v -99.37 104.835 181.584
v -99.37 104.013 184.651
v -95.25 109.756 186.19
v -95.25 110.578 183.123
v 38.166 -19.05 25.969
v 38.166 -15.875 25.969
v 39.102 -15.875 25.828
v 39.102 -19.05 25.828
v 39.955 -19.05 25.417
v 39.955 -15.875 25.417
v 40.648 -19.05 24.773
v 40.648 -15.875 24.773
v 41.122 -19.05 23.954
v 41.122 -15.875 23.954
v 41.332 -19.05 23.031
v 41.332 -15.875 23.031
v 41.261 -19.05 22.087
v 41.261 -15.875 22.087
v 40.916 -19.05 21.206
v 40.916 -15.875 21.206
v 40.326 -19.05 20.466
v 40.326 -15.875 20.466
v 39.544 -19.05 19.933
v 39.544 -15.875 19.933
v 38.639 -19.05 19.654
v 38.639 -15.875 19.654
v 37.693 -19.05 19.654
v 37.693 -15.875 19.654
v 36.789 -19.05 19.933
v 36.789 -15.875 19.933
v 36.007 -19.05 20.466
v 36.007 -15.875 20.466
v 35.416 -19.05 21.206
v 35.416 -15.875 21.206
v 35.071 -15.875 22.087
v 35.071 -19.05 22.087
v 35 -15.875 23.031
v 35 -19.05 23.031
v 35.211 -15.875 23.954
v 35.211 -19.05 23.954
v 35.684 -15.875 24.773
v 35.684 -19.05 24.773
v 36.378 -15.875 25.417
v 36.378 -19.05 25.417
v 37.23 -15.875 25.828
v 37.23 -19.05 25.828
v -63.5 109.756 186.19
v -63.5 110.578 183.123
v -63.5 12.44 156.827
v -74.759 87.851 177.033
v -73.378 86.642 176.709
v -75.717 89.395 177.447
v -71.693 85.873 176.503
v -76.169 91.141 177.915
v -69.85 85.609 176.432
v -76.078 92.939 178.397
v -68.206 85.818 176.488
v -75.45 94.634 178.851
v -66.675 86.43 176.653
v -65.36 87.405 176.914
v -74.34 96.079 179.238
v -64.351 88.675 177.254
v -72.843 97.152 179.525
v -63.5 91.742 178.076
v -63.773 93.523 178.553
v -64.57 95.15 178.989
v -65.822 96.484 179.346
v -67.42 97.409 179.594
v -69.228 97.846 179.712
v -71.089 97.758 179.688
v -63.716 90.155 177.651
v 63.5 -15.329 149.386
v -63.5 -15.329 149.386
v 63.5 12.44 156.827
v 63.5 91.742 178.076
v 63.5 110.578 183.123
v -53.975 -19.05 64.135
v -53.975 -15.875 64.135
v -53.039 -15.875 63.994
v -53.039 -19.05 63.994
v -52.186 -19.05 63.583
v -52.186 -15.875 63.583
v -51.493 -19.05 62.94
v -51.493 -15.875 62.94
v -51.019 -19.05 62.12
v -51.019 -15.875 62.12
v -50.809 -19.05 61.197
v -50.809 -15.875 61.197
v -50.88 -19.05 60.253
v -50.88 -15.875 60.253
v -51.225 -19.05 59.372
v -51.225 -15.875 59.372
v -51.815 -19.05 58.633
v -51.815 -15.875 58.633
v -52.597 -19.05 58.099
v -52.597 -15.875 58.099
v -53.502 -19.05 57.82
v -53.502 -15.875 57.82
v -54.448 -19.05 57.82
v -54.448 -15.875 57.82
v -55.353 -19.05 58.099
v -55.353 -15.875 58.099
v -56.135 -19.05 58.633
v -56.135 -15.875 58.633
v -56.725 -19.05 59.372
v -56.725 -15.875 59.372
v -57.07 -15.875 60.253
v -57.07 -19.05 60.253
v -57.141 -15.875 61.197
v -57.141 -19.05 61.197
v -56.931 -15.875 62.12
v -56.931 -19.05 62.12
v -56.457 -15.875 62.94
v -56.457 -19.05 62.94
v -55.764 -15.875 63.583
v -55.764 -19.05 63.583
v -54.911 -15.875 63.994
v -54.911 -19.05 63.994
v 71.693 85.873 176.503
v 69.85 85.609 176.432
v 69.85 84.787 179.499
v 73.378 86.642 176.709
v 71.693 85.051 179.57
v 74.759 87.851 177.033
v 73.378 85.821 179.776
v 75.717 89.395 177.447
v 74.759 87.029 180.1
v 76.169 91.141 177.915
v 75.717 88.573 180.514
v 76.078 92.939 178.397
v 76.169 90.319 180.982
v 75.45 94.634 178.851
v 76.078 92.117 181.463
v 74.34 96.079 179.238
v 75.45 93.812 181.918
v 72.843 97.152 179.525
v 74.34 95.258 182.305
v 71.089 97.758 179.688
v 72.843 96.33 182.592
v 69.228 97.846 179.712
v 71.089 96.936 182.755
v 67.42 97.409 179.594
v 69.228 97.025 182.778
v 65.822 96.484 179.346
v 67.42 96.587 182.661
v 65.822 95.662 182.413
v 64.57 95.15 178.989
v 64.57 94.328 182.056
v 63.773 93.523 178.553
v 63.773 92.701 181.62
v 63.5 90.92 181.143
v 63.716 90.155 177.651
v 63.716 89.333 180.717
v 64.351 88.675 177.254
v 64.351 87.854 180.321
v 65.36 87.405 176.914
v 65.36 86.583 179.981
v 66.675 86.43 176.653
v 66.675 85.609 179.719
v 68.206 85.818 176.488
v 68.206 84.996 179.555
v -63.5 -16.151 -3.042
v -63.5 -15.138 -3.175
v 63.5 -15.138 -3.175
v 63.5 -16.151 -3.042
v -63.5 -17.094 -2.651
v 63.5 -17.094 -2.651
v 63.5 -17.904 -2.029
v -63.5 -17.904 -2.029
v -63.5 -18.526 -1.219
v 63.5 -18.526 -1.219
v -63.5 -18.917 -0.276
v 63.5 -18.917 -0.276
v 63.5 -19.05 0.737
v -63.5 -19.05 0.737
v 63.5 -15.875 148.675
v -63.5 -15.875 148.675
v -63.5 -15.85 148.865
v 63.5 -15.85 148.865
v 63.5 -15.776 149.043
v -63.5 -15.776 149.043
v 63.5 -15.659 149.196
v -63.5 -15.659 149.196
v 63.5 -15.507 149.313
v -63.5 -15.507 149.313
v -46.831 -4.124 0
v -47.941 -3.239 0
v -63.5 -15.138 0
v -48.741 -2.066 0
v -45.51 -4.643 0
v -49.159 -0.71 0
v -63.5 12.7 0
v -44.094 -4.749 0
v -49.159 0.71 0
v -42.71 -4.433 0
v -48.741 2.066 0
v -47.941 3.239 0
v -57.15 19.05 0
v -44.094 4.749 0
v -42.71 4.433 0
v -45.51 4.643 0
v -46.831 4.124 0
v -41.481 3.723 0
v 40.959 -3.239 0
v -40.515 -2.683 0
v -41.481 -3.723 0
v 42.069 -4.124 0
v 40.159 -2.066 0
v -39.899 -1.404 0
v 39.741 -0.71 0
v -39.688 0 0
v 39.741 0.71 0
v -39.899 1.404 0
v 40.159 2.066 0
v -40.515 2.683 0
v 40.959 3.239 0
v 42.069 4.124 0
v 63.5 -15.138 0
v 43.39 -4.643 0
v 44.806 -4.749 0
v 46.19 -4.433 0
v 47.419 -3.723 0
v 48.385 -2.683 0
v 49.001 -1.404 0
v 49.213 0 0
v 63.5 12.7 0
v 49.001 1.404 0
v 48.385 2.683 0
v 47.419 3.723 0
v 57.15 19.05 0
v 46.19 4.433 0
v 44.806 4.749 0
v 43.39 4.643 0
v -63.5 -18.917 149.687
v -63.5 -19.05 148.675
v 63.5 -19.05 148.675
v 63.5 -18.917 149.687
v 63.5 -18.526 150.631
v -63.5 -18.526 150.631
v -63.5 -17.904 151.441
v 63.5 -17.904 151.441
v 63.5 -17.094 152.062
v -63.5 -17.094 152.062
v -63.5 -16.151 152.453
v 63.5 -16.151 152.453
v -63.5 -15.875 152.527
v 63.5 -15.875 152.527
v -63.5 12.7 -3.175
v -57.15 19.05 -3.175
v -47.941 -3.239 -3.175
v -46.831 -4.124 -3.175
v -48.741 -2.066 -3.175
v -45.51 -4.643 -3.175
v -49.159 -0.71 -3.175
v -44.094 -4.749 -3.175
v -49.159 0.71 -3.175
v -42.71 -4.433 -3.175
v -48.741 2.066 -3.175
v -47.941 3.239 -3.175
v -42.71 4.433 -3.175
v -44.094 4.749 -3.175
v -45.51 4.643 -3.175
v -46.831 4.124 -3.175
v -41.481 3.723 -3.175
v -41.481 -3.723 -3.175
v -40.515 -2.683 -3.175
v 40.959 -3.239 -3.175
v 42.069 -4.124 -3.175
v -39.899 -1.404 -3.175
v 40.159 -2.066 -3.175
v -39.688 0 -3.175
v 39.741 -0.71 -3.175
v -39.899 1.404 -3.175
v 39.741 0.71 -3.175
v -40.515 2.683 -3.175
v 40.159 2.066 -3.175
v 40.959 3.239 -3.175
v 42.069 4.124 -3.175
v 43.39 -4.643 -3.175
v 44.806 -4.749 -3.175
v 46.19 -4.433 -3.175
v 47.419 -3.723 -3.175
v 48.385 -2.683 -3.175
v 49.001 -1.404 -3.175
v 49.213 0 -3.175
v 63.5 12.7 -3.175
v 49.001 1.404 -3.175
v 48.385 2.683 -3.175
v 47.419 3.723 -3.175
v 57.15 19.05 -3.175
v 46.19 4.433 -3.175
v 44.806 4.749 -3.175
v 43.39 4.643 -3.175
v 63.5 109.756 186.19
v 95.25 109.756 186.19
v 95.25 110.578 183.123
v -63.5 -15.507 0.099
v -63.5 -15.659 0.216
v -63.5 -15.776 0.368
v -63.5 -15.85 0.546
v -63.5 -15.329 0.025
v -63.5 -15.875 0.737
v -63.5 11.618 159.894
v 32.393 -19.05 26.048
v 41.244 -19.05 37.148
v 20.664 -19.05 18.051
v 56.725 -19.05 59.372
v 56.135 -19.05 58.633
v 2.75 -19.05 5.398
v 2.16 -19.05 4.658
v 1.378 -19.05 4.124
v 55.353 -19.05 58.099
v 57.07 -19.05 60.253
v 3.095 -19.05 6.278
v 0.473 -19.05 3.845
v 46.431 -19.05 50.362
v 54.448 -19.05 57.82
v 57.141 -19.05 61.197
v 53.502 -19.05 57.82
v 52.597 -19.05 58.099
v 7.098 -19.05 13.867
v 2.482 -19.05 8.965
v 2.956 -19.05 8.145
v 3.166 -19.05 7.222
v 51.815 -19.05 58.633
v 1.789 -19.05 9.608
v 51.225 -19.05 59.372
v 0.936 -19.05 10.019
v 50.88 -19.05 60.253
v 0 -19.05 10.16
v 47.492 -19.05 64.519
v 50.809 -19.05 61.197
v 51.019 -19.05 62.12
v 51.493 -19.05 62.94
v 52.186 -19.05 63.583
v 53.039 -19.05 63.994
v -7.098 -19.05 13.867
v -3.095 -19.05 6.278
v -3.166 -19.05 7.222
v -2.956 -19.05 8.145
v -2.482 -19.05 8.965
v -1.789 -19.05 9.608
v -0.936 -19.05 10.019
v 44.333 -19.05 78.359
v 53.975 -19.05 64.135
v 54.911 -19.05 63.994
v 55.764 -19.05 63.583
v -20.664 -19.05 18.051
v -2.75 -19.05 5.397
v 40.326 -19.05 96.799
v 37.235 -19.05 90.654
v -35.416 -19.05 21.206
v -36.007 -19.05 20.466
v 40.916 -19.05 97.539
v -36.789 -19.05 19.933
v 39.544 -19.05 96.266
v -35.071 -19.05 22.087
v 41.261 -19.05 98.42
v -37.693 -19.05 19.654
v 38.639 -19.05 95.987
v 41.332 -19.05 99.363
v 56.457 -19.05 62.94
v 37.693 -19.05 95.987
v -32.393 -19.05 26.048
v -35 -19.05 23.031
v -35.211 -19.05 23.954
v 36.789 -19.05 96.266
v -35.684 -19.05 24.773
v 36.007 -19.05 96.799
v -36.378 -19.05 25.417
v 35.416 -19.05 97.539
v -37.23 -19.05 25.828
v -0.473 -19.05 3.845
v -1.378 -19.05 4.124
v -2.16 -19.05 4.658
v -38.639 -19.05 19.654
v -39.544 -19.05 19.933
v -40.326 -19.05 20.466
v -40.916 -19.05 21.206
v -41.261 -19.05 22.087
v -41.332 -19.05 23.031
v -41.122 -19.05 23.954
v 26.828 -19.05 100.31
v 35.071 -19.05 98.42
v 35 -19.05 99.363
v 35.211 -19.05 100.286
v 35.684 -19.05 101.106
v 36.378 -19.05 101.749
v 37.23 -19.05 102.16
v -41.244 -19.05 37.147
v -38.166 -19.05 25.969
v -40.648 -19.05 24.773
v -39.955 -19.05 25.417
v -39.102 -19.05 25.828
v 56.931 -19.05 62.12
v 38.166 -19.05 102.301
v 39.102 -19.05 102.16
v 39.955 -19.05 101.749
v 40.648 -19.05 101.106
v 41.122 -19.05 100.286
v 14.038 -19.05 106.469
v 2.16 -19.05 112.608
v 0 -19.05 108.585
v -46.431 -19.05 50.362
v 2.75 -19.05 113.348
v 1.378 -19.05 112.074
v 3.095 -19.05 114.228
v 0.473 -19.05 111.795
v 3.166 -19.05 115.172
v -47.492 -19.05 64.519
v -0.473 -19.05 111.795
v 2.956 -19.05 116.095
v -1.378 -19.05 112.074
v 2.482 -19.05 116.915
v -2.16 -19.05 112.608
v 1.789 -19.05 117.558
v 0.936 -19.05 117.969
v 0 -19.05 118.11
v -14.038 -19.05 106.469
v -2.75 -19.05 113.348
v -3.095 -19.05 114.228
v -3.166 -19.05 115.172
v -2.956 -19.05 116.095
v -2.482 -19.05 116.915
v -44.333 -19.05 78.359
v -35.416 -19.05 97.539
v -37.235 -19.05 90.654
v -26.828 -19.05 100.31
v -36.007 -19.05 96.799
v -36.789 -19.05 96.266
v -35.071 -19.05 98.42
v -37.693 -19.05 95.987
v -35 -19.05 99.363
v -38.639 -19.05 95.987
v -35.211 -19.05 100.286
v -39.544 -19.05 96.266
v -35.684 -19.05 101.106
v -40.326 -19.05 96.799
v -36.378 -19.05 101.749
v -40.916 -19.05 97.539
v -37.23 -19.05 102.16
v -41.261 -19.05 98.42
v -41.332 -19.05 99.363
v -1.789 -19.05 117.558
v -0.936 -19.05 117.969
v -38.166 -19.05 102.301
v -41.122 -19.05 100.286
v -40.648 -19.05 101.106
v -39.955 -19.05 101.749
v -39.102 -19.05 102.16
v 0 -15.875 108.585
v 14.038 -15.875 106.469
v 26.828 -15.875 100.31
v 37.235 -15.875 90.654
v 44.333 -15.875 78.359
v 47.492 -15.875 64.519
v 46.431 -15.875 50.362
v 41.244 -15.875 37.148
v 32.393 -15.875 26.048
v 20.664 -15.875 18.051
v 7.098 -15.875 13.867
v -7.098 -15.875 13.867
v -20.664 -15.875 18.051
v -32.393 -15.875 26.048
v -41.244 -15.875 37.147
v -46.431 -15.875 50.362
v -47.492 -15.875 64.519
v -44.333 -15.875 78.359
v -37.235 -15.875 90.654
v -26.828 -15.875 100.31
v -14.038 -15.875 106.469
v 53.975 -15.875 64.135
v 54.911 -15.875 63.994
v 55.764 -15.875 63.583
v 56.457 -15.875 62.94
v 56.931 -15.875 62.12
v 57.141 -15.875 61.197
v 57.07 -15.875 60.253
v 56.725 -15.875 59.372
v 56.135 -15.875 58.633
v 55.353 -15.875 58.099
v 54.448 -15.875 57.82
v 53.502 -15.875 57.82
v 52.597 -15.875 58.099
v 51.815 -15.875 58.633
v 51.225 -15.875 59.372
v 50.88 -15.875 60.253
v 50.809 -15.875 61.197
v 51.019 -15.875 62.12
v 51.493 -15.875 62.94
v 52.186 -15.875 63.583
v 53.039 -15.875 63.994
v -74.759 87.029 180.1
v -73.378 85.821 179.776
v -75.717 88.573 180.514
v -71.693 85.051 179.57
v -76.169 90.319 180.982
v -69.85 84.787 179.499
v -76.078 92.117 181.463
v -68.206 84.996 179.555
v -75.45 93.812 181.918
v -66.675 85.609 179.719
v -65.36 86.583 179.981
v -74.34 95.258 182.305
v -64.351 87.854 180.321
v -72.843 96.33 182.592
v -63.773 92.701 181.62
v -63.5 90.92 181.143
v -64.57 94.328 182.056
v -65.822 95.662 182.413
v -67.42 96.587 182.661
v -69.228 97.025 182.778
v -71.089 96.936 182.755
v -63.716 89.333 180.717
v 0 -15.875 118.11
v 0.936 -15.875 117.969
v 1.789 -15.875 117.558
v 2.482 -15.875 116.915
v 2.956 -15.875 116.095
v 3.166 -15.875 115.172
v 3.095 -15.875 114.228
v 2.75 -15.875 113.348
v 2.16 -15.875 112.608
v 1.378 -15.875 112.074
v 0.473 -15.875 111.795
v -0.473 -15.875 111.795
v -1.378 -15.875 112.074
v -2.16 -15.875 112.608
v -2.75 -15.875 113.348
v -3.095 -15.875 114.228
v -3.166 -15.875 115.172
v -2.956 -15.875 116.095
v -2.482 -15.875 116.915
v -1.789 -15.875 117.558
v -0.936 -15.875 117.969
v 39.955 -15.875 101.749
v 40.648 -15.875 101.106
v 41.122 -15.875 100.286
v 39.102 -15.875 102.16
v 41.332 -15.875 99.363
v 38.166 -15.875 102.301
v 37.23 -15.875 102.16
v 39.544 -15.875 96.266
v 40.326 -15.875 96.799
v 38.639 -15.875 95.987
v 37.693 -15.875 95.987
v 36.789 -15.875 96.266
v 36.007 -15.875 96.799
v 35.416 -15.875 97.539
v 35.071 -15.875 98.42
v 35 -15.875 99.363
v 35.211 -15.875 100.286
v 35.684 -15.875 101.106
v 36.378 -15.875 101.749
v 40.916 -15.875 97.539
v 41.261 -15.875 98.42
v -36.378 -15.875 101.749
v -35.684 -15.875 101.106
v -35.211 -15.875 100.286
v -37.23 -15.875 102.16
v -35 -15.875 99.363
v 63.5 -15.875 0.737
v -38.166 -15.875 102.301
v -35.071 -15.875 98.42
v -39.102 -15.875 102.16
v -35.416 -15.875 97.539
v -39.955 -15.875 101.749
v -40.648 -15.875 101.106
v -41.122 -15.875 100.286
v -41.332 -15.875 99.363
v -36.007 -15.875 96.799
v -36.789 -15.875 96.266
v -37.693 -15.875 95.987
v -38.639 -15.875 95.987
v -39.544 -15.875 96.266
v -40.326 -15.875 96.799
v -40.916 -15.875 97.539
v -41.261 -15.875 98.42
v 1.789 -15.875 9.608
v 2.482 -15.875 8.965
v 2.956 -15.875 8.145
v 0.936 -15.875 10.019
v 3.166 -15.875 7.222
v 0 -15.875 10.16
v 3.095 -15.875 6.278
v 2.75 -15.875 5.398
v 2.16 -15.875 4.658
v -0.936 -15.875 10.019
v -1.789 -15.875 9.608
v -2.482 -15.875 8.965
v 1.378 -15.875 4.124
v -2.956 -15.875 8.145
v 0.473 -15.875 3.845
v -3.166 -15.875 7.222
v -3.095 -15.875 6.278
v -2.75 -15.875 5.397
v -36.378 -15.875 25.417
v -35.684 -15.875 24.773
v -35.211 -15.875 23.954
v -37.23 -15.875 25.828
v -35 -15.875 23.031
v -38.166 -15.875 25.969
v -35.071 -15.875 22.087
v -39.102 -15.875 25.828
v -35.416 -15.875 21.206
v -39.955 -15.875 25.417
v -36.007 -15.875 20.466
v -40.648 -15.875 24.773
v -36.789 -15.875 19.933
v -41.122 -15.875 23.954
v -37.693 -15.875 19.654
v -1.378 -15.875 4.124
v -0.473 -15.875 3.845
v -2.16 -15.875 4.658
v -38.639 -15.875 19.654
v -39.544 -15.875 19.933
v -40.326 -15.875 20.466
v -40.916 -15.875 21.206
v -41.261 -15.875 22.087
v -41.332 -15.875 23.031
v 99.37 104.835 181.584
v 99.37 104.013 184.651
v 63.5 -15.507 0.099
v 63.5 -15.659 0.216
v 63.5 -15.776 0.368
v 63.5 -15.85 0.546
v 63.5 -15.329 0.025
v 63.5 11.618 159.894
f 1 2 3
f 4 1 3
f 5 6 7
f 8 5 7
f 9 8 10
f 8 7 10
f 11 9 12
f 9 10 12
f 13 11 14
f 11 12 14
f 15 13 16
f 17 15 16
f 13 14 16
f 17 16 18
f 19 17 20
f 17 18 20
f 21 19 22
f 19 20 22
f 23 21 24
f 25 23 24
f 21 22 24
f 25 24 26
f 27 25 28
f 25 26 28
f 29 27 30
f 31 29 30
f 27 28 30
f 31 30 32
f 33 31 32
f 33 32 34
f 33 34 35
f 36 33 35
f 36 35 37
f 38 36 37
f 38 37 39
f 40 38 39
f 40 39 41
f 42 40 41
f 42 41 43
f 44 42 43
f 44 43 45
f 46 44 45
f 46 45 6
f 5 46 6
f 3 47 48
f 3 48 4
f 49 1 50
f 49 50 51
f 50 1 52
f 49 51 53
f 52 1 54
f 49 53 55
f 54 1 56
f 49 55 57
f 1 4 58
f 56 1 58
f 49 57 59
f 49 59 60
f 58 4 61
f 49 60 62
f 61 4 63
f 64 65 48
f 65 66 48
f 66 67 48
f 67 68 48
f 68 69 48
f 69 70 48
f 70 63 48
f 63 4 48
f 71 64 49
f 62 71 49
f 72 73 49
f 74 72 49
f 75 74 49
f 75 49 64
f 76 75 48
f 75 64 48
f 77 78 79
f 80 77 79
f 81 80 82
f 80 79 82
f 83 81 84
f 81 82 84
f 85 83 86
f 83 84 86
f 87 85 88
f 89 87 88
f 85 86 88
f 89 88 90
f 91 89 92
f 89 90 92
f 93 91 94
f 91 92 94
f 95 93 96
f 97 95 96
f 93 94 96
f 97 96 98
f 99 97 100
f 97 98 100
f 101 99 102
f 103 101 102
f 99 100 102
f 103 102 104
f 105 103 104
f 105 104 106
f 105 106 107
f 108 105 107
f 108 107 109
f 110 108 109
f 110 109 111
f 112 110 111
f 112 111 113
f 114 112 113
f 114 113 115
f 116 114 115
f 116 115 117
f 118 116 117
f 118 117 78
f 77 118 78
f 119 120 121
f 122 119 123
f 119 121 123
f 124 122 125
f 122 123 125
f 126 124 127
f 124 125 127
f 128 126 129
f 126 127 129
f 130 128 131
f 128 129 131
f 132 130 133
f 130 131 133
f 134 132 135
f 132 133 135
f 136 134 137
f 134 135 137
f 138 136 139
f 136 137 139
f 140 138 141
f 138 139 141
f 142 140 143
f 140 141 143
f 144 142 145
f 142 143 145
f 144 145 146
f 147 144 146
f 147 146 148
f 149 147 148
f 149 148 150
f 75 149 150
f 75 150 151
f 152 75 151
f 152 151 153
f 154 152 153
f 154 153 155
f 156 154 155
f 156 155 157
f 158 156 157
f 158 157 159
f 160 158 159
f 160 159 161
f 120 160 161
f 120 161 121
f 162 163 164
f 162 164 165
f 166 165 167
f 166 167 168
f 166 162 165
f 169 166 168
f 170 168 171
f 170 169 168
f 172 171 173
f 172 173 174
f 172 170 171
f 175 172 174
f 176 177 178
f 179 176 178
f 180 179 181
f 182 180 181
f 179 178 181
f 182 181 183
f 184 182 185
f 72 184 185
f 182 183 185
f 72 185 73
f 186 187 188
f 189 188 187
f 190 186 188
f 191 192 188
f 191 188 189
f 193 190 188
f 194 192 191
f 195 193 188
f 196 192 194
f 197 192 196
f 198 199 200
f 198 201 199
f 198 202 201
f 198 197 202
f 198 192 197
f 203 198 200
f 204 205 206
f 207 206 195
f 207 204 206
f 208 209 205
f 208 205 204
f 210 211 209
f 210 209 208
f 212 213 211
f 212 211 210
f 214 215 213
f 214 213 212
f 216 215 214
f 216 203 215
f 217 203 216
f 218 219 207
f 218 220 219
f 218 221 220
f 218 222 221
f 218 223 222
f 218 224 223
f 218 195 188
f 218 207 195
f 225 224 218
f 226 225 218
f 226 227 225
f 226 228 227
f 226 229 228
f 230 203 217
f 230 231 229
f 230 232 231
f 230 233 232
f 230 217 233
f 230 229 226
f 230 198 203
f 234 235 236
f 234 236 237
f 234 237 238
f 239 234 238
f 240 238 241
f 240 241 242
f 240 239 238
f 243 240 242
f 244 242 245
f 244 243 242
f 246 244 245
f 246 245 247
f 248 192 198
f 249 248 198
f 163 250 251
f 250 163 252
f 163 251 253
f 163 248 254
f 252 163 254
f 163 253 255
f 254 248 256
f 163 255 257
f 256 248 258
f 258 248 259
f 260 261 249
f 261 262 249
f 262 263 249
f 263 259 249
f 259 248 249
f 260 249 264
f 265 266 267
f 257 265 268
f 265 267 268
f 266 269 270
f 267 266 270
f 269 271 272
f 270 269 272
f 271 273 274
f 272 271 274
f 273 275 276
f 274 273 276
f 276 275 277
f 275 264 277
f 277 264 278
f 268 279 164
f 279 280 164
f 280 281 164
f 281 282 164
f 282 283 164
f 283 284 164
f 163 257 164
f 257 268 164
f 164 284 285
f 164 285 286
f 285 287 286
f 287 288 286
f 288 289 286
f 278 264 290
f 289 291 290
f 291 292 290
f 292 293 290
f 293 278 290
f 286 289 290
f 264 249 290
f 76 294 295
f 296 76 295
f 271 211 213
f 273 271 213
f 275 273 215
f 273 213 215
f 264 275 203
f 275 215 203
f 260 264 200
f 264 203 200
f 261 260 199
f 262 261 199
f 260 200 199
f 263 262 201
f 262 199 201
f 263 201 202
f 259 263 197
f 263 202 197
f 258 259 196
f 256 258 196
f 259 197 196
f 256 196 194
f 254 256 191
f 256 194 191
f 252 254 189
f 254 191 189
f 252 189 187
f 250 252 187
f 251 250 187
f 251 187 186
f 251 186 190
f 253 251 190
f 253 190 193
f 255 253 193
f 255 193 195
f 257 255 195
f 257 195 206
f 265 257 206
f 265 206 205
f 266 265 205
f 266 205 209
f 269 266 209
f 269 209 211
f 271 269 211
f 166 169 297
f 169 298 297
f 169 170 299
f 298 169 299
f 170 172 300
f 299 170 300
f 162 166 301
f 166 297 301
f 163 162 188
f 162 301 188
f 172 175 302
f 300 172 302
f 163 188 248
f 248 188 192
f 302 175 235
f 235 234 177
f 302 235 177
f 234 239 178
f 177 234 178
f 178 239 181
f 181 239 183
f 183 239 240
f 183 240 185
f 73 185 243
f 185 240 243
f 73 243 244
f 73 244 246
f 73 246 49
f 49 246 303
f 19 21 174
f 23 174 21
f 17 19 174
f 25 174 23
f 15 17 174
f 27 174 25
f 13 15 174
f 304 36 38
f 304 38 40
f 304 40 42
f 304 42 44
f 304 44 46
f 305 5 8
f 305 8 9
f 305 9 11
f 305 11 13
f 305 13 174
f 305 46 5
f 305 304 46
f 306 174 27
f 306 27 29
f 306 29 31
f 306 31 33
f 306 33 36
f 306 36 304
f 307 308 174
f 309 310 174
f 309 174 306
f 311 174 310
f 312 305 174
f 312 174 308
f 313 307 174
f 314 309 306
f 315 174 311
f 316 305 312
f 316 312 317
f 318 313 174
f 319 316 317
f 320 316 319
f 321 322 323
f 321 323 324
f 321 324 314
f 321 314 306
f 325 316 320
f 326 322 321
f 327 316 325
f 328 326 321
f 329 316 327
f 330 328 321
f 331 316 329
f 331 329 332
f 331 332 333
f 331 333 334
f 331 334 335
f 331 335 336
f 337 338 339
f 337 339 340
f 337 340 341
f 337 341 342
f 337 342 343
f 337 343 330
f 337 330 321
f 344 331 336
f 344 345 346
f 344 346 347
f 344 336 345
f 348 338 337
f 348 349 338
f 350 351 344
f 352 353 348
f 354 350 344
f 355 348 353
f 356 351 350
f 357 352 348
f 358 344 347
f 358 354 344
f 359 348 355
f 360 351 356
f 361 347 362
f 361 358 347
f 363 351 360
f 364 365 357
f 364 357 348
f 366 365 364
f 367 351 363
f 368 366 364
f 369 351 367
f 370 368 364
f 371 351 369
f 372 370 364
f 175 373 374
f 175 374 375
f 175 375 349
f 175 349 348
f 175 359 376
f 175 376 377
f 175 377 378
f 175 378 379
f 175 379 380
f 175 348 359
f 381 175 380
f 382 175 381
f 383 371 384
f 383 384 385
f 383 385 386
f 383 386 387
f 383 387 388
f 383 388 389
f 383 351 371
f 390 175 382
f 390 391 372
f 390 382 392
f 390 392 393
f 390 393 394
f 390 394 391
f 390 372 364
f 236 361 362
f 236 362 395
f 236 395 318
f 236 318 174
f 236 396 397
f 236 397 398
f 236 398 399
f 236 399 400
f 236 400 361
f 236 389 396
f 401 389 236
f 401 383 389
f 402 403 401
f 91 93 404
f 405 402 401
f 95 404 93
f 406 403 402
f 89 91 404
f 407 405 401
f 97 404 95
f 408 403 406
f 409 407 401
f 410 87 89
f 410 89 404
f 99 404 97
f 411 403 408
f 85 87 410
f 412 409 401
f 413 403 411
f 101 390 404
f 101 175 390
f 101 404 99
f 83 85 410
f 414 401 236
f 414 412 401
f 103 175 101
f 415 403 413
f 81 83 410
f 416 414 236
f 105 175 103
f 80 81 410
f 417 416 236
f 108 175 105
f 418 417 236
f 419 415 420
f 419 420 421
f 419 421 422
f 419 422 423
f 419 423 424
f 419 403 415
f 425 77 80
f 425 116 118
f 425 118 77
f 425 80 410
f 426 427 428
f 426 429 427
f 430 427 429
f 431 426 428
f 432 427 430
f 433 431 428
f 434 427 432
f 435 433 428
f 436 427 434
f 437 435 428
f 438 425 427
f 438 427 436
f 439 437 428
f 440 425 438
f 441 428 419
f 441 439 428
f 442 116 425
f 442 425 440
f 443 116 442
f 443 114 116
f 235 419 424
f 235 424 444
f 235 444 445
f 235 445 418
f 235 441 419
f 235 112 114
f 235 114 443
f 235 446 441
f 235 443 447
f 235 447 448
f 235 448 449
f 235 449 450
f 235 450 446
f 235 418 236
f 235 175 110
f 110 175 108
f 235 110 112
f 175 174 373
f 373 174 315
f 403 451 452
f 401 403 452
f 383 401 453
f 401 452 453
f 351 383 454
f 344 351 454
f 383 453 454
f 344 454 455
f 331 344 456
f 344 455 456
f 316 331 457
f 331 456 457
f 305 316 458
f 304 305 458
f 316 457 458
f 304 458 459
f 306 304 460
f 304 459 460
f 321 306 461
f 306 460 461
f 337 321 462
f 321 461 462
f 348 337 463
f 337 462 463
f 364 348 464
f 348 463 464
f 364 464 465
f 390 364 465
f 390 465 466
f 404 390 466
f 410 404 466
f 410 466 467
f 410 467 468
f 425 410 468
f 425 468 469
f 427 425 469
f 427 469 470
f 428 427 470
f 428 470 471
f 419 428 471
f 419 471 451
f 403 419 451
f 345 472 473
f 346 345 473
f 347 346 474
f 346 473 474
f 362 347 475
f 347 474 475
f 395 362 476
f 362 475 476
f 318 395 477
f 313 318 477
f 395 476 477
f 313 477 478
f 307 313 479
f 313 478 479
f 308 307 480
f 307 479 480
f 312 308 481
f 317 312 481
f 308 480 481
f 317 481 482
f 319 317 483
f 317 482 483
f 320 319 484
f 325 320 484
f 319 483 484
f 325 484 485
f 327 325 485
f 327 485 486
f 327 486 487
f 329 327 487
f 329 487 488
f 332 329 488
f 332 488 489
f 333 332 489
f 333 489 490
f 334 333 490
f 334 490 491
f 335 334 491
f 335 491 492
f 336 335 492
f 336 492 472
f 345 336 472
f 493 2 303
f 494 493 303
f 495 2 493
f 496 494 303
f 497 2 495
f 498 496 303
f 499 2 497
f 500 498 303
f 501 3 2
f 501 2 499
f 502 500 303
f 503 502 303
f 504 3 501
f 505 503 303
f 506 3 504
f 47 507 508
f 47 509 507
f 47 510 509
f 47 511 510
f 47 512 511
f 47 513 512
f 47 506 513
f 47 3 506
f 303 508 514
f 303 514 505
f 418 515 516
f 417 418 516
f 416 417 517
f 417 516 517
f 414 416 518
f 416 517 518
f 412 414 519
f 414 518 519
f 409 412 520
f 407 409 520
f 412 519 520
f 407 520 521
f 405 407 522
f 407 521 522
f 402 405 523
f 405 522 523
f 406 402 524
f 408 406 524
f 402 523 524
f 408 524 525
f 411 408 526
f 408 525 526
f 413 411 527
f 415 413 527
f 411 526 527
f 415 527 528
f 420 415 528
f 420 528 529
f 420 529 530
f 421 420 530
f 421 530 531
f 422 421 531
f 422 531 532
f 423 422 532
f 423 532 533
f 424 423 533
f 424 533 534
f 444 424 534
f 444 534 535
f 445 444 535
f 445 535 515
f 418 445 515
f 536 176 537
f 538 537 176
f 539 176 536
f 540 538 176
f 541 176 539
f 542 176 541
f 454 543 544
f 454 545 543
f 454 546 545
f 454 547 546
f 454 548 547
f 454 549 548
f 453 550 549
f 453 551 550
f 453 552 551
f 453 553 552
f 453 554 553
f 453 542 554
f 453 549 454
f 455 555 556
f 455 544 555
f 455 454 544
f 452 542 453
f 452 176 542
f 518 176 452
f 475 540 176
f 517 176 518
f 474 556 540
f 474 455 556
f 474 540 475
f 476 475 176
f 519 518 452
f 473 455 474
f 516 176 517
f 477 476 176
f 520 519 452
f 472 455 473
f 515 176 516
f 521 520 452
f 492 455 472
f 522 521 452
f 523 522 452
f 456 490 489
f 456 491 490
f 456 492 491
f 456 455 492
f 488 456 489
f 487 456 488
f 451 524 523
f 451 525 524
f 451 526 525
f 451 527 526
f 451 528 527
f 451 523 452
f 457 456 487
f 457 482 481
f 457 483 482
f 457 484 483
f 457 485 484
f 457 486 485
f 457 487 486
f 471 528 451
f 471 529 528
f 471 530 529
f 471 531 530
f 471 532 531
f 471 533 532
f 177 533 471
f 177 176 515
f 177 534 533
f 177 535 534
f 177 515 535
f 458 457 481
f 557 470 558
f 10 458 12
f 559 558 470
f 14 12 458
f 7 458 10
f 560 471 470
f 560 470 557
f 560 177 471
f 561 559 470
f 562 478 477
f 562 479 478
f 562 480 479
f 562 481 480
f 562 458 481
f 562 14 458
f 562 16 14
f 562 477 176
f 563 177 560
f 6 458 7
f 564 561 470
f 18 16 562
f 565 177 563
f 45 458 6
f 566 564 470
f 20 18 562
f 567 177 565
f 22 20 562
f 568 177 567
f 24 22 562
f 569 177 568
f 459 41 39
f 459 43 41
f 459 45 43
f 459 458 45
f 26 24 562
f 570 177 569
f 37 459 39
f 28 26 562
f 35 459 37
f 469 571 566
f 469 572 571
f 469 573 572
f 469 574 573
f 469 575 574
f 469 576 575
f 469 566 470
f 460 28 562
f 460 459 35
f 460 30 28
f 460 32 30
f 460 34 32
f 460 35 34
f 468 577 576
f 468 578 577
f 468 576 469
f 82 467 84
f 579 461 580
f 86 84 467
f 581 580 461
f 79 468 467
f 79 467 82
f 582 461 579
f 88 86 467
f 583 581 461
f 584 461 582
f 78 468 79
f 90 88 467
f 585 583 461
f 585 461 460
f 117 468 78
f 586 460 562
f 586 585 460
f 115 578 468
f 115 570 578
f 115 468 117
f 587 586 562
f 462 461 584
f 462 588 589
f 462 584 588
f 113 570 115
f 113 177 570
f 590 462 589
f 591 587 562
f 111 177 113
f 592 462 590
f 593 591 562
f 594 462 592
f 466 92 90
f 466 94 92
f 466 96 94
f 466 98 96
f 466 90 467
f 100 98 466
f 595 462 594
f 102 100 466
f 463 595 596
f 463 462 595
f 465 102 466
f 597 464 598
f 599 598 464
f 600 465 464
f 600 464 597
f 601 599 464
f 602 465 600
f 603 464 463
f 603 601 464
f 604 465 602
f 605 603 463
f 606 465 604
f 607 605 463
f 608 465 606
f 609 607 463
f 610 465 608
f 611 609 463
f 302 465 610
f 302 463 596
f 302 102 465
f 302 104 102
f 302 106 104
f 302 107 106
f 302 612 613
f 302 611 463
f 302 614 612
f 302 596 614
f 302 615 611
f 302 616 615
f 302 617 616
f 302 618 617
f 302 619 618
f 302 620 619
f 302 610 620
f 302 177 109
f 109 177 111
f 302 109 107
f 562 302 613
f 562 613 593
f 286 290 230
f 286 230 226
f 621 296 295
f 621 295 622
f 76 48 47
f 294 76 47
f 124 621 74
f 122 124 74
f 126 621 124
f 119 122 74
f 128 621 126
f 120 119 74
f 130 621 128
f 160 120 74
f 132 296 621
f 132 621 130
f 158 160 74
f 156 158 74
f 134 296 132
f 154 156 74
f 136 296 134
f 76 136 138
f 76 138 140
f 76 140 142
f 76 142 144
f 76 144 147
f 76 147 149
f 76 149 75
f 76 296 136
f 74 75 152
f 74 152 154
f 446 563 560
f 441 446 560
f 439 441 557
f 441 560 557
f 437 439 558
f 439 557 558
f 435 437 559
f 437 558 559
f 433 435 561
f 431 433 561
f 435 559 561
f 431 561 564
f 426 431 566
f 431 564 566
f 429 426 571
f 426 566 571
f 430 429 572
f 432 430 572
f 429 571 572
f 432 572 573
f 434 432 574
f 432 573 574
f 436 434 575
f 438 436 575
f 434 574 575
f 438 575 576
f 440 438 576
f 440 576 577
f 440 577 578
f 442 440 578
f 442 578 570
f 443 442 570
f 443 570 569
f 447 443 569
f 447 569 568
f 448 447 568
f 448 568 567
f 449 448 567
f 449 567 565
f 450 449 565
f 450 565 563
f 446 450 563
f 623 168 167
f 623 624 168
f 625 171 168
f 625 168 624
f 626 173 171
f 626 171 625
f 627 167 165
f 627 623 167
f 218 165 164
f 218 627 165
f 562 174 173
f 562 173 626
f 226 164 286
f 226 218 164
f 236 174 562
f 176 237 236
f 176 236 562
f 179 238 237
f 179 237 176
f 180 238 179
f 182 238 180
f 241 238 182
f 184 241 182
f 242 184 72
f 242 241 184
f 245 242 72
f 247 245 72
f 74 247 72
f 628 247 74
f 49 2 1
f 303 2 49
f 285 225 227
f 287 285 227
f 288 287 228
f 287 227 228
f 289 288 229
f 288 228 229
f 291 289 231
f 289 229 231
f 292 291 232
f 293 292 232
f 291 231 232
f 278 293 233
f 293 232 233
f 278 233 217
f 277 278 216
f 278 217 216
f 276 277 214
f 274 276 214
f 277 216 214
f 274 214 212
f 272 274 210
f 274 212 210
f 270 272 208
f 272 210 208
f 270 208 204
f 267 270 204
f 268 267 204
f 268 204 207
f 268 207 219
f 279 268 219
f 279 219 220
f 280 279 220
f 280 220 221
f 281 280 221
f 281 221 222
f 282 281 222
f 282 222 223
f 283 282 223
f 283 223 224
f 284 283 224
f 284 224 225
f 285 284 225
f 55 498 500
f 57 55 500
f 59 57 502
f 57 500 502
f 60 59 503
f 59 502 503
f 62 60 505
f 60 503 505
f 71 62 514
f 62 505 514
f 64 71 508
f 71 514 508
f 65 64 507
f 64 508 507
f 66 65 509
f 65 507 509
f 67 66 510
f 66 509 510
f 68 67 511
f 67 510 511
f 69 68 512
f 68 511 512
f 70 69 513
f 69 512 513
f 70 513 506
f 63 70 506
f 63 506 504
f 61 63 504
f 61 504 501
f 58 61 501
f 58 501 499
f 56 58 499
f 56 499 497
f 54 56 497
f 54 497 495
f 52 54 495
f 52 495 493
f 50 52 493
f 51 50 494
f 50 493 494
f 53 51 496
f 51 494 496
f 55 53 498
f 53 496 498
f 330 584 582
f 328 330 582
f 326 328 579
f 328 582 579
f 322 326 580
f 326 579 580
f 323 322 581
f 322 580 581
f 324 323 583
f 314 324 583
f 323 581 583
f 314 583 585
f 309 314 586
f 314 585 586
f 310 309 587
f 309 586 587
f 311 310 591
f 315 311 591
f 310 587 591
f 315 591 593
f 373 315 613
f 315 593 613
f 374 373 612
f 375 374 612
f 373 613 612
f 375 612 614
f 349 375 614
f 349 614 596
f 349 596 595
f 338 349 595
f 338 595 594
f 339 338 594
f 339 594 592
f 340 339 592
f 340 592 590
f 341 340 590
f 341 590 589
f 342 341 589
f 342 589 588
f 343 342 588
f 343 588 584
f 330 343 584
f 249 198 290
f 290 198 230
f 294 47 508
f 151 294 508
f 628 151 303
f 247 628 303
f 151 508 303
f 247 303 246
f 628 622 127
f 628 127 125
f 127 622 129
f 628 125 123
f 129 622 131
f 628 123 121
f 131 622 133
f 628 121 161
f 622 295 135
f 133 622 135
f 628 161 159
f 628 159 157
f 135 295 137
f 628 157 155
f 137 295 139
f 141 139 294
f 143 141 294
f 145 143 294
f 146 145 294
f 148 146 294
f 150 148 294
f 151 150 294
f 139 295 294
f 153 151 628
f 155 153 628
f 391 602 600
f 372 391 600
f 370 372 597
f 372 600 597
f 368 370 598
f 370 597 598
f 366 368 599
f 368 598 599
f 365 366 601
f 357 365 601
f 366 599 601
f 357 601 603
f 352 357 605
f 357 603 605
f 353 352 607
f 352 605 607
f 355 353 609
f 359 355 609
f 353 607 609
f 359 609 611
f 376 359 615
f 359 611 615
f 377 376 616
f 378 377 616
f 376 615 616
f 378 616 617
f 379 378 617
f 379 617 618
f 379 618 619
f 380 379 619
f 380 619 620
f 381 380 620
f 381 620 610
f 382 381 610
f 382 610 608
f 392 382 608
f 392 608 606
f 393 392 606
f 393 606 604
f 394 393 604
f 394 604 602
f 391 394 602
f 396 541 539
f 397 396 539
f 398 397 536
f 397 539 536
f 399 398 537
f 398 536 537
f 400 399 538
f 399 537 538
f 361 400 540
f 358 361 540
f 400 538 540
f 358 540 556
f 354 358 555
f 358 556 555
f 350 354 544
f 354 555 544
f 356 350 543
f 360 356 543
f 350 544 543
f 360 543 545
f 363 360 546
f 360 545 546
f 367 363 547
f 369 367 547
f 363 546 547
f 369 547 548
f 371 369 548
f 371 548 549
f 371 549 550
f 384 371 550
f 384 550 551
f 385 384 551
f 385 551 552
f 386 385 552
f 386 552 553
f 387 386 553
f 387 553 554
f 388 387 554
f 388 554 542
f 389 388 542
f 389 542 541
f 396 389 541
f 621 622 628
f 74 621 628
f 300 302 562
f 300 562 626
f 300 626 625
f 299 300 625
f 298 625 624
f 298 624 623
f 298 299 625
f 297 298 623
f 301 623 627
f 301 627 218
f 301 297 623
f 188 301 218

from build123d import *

# Parameters (mm, degrees)
SKETCH1_W                    = 127
SKETCH1_H                    = 38.1
BASE_FLANGE1_DEPTH           = 3.175
EDGE_FLANGE1_STRIP_W         = 14.1732
EDGE_FLANGE1_STRIP_H         = 3.175
EDGE_FLANGE1_STRIP_CUT_DEPTH = 127
EDGE_FLANGE1_DEPTH           = 127
SKETCH9_R                    = 3.175
SKETCH9_R_2                  = 47.625
CUT_EXTRUDE1_DEPTH           = 169.868266273
EDGE_FLANGE2_START           = -63.5
EDGE_FLANGE2_DEPTH           = 127
EDGE_FLANGE2_2_DEPTH         = 127
TAB1_DEPTH                   = 3.175
SKETCH16_R                   = 6.35
CUT_EXTRUDE2_DEPTH           = 235.714429908
BREAK_CORNER1_START          = -171.342480702
BREAK_CORNER1_OUTLINE_W      = 10
BREAK_CORNER1_OUTLINE_H      = 6
BREAK_CORNER1_DEPTH          = 5.219227672
BREAK_CORNER1_START_2        = 166.12325303
BREAK_CORNER1_2_OUTLINE_W    = 10
BREAK_CORNER1_2_OUTLINE_H    = 6
BREAK_CORNER1_2_DEPTH        = 5.219227672
BREAK_CORNER1_START_3        = 53.881536726
BREAK_CORNER1_3_OUTLINE_W    = 12
BREAK_CORNER1_3_OUTLINE_H    = 6
BREAK_CORNER1_3_DEPTH        = 4.490128061
BREAK_CORNER1_START_4        = -58.371664787
BREAK_CORNER1_4_OUTLINE_W    = 12
BREAK_CORNER1_4_OUTLINE_H    = 6
BREAK_CORNER1_4_DEPTH        = 4.490128061
SKETCH17_R                   = 4.7625
CUT_EXTRUDE3_DEPTH           = 239.261598489


# Read off the part's stored shape, not the designer's step: Edge-Flange2, Break-Corner1
# Sheet-metal steps are written as plain solids
with BuildPart() as part:
    # Sketch1 → Base-Flange1 (new body)
    with BuildSketch(Plane.XY):
        Rectangle(SKETCH1_W, SKETCH1_H)
    extrude(amount=-BASE_FLANGE1_DEPTH)

    # Edge-Flange1 strip (across the edge) → Edge-Flange1 strip cut (cut)
    with BuildSketch(Plane(origin=(-63.5, -19.05, 0), x_dir=(0, 1, 0), z_dir=(1, 0, 0))):
        with Locations((-3.175, -1.5875)):
            Rectangle(EDGE_FLANGE1_STRIP_W, EDGE_FLANGE1_STRIP_H)
    extrude(amount=EDGE_FLANGE1_STRIP_CUT_DEPTH, mode=Mode.SUBTRACT)

    # Edge-Flange1 section (across the edge) → Edge-Flange1 (add)
    with BuildSketch(Plane(origin=(-63.5, -19.05, 0), x_dir=(0, 1, 0), z_dir=(1, 0, 0))):
        with BuildLine():
            Line((0, 0.7366), (0, 152.527))
            Line((0, 152.527), (3.175, 152.527))
            Line((3.175, 152.527), (3.175, 0.7366))
            ThreePointArc((3.175, 0.7366), (3.390745145, 0.215745145), (3.9116, 0))
            Line((3.9116, 0), (3.9116, -3.175))
            ThreePointArc((3.9116, -3.175), (1.145681115, -2.029318885), (0, 0.7366))
        make_face()
    extrude(amount=EDGE_FLANGE1_DEPTH)

    # Sketch9 → Cut-Extrude1 (cut, through all)
    with BuildSketch(Plane(origin=(0, -15.875, 0), x_dir=(1, 0, 0), z_dir=(0, 1, 0))):
        with Locations(Location((0, -6.985, 0), (0, 0, 270))):
            Circle(SKETCH9_R)
        with Locations(Location((38.166088515, -22.793911485, 0), (0, 0, 270))):
            Circle(SKETCH9_R)
        with Locations(Location((53.975, -60.96, 0), (0, 0, 270))):
            Circle(SKETCH9_R)
        with Locations(Location((38.166088515, -99.126088515, 0), (0, 0, 270))):
            Circle(SKETCH9_R)
        with Locations(Location((0, -114.935, 0), (0, 0, 270))):
            Circle(SKETCH9_R)
        with Locations(Location((-38.166088515, -99.126088515, 0), (0, 0, 270))):
            Circle(SKETCH9_R)
        with Locations(Location((-53.975, -60.96, 0), (0, 0, 270))):
            Circle(SKETCH9_R)
        with Locations(Location((-38.166088515, -22.793911485, 0), (0, 0, 270))):
            Circle(SKETCH9_R)
        with Locations(Location((0, -60.96, 0), (0, 0, 270))):
            Circle(SKETCH9_R_2)
    extrude(amount=-CUT_EXTRUDE1_DEPTH, mode=Mode.SUBTRACT)

    # Edge-Flange2 outline → Edge-Flange2 (cut)
    with BuildSketch(Plane.YZ.offset(EDGE_FLANGE2_START)):
        with BuildLine():
            ThreePointArc((-19.05, 148.674785068), (-18.241680926, 151.056016274), (-16.150796577, 152.45310053))
            Line((-16.150796577, 152.45310053), (-15.875, 152.527))
            Line((-15.875, 152.527), (-19.05, 152.527))
            Line((-19.05, 152.527), (-19.05, 148.674785068))
        make_face()
    extrude(amount=EDGE_FLANGE2_DEPTH, mode=Mode.SUBTRACT)

    # Edge-Flange2 2 outline → Edge-Flange2 2 (add)
    with BuildSketch(Plane.YZ.offset(EDGE_FLANGE2_START)):
        with BuildLine():
            Line((109.756208936, 186.189780978), (-15.875, 152.527))
            Line((-15.875, 152.527), (-15.875, 148.674785068))
            ThreePointArc((-15.875, 148.674785068), (-15.72278407, 149.123198736), (-15.329046109, 149.386286031))
            Line((-15.329046109, 149.386286031), (110.577959404, 183.12296648))
            Line((110.577959404, 183.12296648), (109.756208936, 186.189780978))
        make_face()
    extrude(amount=EDGE_FLANGE2_2_DEPTH)

    # Sketch13 → Tab1 (add)
    with BuildSketch(Plane(origin=(0, -39.195173357, 146.278378382), x_dir=(1, 0, 0), z_dir=(0, -0.258819045102528, 0.9659258262890663))):
        Polygon((-63.5, 154.205818127), (-101.6, 154.205818127), (-63.5, 52.605818127), align=None)
        Polygon((101.6, 154.205818127), (63.5, 52.605818127), (63.5, 154.205818127), align=None)
    extrude(amount=-TAB1_DEPTH)

    # Sketch16 → Cut-Extrude2 (cut, through all)
    with BuildSketch(Plane(origin=(0, -39.195173357, 146.278378382), x_dir=(1, 0, 0), z_dir=(0, -0.258819045102528, 0.9659258262890663))):
        with Locations(Location((69.85, 134.705637142, 0), (0, 0, 270))):
            Circle(SKETCH16_R)
        with Locations(Location((-69.85, 134.705637142, 0), (0, 0, 270))):
            Circle(SKETCH16_R)
    extrude(amount=-CUT_EXTRUDE2_DEPTH, mode=Mode.SUBTRACT)

    # Break-Corner1 outline → Break-Corner1 (cut)
    with BuildSketch(Plane(origin=(0, 0, 0), x_dir=(0.5695948377626004, 0.7939191812855688, 0.212730003481053), z_dir=(0.8219256175556257, -0.5501863643158269, -0.14742199200504597)).offset(BREAK_CORNER1_START)):
        with Locations((69, 150)):
            Rectangle(BREAK_CORNER1_OUTLINE_W, BREAK_CORNER1_OUTLINE_H)
    extrude(amount=BREAK_CORNER1_DEPTH, mode=Mode.SUBTRACT)

    # Break-Corner1 2 outline → Break-Corner1 2 (cut)
    with BuildSketch(Plane(origin=(0, 0, 0), x_dir=(0.5695948377626027, -0.7939191812855675, -0.21273000348105187), z_dir=(0.8219256175556241, 0.5501863643158292, 0.14742199200504602)).offset(BREAK_CORNER1_START_2)):
        with Locations((-69, -150)):
            Rectangle(BREAK_CORNER1_2_OUTLINE_W, BREAK_CORNER1_2_OUTLINE_H)
    extrude(amount=BREAK_CORNER1_2_DEPTH, mode=Mode.SUBTRACT)

    # Break-Corner1 3 outline → Break-Corner1 3 (cut)
    with BuildSketch(Plane(origin=(0, 0, 0), x_dir=(0.707106781186548, -0.707106781186547, 0), z_dir=(0.707106781186547, 0.707106781186548, 0)).offset(BREAK_CORNER1_START_3)):
        with Locations((31, 2)):
            Rectangle(BREAK_CORNER1_3_OUTLINE_W, BREAK_CORNER1_3_OUTLINE_H)
    extrude(amount=BREAK_CORNER1_3_DEPTH, mode=Mode.SUBTRACT)

    # Break-Corner1 4 outline → Break-Corner1 4 (cut)
    with BuildSketch(Plane(origin=(0, 0, 0), x_dir=(0.7071067811865474, 0.7071067811865477, 0), z_dir=(0.7071067811865476, -0.7071067811865476, 0)).offset(BREAK_CORNER1_START_4)):
        with Locations((-31, -2)):
            Rectangle(BREAK_CORNER1_4_OUTLINE_W, BREAK_CORNER1_4_OUTLINE_H)
    extrude(amount=BREAK_CORNER1_4_DEPTH, mode=Mode.SUBTRACT)

    # Sketch17 → Cut-Extrude3 (cut, through all)
    with BuildSketch(Plane.XY):
        with Locations((44.45, 0)):
            Circle(SKETCH17_R)
        with Locations((-44.45, 0)):
            Circle(SKETCH17_R)
    extrude(amount=-CUT_EXTRUDE3_DEPTH, mode=Mode.SUBTRACT)


solid = part.part
